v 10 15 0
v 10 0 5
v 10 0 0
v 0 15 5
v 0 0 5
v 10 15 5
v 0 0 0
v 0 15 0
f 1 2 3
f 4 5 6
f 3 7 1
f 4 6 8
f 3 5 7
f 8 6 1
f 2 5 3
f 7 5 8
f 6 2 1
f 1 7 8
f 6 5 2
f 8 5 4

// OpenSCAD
$fn=7;
hull()
{
	hull()
	{
		translate([0,0,0])
		{
			rotate(0,[0,0,1])
			{
				cube([0.5,0.5,0.5]);
			}
		}
		translate([0,14.5,0])
		{
			rotate(0,[0,0,1])
			{
				cube([0.5,0.5,0.5]);
			}
		}
		translate([9.5,14.5,0])
		{
			rotate(0,[0,0,1])
			{
				cube([0.5,0.5,0.5]);
			}
		}
		translate([9.5,0,0])
		{
			rotate(0,[0,0,1])
			{
				cube([0.5,0.5,0.5]);
			}
		}
	}
	hull()
	{
		translate([0,0,4.5])
		{
			rotate(0,[0,0,1])
			{
				cube([0.5,0.5,0.5]);
			}
		}
		translate([0,14.5,4.5])
		{
			rotate(0,[0,0,1])
			{
				cube([0.5,0.5,0.5]);
			}
		}
		translate([9.5,14.5,4.5])
		{
			rotate(0,[0,0,1])
			{
				cube([0.5,0.5,0.5]);
			}
		}
		translate([9.5,0,4.5])
		{
			rotate(0,[0,0,1])
			{
				cube([0.5,0.5,0.5]);
			}
		}
	}
}
